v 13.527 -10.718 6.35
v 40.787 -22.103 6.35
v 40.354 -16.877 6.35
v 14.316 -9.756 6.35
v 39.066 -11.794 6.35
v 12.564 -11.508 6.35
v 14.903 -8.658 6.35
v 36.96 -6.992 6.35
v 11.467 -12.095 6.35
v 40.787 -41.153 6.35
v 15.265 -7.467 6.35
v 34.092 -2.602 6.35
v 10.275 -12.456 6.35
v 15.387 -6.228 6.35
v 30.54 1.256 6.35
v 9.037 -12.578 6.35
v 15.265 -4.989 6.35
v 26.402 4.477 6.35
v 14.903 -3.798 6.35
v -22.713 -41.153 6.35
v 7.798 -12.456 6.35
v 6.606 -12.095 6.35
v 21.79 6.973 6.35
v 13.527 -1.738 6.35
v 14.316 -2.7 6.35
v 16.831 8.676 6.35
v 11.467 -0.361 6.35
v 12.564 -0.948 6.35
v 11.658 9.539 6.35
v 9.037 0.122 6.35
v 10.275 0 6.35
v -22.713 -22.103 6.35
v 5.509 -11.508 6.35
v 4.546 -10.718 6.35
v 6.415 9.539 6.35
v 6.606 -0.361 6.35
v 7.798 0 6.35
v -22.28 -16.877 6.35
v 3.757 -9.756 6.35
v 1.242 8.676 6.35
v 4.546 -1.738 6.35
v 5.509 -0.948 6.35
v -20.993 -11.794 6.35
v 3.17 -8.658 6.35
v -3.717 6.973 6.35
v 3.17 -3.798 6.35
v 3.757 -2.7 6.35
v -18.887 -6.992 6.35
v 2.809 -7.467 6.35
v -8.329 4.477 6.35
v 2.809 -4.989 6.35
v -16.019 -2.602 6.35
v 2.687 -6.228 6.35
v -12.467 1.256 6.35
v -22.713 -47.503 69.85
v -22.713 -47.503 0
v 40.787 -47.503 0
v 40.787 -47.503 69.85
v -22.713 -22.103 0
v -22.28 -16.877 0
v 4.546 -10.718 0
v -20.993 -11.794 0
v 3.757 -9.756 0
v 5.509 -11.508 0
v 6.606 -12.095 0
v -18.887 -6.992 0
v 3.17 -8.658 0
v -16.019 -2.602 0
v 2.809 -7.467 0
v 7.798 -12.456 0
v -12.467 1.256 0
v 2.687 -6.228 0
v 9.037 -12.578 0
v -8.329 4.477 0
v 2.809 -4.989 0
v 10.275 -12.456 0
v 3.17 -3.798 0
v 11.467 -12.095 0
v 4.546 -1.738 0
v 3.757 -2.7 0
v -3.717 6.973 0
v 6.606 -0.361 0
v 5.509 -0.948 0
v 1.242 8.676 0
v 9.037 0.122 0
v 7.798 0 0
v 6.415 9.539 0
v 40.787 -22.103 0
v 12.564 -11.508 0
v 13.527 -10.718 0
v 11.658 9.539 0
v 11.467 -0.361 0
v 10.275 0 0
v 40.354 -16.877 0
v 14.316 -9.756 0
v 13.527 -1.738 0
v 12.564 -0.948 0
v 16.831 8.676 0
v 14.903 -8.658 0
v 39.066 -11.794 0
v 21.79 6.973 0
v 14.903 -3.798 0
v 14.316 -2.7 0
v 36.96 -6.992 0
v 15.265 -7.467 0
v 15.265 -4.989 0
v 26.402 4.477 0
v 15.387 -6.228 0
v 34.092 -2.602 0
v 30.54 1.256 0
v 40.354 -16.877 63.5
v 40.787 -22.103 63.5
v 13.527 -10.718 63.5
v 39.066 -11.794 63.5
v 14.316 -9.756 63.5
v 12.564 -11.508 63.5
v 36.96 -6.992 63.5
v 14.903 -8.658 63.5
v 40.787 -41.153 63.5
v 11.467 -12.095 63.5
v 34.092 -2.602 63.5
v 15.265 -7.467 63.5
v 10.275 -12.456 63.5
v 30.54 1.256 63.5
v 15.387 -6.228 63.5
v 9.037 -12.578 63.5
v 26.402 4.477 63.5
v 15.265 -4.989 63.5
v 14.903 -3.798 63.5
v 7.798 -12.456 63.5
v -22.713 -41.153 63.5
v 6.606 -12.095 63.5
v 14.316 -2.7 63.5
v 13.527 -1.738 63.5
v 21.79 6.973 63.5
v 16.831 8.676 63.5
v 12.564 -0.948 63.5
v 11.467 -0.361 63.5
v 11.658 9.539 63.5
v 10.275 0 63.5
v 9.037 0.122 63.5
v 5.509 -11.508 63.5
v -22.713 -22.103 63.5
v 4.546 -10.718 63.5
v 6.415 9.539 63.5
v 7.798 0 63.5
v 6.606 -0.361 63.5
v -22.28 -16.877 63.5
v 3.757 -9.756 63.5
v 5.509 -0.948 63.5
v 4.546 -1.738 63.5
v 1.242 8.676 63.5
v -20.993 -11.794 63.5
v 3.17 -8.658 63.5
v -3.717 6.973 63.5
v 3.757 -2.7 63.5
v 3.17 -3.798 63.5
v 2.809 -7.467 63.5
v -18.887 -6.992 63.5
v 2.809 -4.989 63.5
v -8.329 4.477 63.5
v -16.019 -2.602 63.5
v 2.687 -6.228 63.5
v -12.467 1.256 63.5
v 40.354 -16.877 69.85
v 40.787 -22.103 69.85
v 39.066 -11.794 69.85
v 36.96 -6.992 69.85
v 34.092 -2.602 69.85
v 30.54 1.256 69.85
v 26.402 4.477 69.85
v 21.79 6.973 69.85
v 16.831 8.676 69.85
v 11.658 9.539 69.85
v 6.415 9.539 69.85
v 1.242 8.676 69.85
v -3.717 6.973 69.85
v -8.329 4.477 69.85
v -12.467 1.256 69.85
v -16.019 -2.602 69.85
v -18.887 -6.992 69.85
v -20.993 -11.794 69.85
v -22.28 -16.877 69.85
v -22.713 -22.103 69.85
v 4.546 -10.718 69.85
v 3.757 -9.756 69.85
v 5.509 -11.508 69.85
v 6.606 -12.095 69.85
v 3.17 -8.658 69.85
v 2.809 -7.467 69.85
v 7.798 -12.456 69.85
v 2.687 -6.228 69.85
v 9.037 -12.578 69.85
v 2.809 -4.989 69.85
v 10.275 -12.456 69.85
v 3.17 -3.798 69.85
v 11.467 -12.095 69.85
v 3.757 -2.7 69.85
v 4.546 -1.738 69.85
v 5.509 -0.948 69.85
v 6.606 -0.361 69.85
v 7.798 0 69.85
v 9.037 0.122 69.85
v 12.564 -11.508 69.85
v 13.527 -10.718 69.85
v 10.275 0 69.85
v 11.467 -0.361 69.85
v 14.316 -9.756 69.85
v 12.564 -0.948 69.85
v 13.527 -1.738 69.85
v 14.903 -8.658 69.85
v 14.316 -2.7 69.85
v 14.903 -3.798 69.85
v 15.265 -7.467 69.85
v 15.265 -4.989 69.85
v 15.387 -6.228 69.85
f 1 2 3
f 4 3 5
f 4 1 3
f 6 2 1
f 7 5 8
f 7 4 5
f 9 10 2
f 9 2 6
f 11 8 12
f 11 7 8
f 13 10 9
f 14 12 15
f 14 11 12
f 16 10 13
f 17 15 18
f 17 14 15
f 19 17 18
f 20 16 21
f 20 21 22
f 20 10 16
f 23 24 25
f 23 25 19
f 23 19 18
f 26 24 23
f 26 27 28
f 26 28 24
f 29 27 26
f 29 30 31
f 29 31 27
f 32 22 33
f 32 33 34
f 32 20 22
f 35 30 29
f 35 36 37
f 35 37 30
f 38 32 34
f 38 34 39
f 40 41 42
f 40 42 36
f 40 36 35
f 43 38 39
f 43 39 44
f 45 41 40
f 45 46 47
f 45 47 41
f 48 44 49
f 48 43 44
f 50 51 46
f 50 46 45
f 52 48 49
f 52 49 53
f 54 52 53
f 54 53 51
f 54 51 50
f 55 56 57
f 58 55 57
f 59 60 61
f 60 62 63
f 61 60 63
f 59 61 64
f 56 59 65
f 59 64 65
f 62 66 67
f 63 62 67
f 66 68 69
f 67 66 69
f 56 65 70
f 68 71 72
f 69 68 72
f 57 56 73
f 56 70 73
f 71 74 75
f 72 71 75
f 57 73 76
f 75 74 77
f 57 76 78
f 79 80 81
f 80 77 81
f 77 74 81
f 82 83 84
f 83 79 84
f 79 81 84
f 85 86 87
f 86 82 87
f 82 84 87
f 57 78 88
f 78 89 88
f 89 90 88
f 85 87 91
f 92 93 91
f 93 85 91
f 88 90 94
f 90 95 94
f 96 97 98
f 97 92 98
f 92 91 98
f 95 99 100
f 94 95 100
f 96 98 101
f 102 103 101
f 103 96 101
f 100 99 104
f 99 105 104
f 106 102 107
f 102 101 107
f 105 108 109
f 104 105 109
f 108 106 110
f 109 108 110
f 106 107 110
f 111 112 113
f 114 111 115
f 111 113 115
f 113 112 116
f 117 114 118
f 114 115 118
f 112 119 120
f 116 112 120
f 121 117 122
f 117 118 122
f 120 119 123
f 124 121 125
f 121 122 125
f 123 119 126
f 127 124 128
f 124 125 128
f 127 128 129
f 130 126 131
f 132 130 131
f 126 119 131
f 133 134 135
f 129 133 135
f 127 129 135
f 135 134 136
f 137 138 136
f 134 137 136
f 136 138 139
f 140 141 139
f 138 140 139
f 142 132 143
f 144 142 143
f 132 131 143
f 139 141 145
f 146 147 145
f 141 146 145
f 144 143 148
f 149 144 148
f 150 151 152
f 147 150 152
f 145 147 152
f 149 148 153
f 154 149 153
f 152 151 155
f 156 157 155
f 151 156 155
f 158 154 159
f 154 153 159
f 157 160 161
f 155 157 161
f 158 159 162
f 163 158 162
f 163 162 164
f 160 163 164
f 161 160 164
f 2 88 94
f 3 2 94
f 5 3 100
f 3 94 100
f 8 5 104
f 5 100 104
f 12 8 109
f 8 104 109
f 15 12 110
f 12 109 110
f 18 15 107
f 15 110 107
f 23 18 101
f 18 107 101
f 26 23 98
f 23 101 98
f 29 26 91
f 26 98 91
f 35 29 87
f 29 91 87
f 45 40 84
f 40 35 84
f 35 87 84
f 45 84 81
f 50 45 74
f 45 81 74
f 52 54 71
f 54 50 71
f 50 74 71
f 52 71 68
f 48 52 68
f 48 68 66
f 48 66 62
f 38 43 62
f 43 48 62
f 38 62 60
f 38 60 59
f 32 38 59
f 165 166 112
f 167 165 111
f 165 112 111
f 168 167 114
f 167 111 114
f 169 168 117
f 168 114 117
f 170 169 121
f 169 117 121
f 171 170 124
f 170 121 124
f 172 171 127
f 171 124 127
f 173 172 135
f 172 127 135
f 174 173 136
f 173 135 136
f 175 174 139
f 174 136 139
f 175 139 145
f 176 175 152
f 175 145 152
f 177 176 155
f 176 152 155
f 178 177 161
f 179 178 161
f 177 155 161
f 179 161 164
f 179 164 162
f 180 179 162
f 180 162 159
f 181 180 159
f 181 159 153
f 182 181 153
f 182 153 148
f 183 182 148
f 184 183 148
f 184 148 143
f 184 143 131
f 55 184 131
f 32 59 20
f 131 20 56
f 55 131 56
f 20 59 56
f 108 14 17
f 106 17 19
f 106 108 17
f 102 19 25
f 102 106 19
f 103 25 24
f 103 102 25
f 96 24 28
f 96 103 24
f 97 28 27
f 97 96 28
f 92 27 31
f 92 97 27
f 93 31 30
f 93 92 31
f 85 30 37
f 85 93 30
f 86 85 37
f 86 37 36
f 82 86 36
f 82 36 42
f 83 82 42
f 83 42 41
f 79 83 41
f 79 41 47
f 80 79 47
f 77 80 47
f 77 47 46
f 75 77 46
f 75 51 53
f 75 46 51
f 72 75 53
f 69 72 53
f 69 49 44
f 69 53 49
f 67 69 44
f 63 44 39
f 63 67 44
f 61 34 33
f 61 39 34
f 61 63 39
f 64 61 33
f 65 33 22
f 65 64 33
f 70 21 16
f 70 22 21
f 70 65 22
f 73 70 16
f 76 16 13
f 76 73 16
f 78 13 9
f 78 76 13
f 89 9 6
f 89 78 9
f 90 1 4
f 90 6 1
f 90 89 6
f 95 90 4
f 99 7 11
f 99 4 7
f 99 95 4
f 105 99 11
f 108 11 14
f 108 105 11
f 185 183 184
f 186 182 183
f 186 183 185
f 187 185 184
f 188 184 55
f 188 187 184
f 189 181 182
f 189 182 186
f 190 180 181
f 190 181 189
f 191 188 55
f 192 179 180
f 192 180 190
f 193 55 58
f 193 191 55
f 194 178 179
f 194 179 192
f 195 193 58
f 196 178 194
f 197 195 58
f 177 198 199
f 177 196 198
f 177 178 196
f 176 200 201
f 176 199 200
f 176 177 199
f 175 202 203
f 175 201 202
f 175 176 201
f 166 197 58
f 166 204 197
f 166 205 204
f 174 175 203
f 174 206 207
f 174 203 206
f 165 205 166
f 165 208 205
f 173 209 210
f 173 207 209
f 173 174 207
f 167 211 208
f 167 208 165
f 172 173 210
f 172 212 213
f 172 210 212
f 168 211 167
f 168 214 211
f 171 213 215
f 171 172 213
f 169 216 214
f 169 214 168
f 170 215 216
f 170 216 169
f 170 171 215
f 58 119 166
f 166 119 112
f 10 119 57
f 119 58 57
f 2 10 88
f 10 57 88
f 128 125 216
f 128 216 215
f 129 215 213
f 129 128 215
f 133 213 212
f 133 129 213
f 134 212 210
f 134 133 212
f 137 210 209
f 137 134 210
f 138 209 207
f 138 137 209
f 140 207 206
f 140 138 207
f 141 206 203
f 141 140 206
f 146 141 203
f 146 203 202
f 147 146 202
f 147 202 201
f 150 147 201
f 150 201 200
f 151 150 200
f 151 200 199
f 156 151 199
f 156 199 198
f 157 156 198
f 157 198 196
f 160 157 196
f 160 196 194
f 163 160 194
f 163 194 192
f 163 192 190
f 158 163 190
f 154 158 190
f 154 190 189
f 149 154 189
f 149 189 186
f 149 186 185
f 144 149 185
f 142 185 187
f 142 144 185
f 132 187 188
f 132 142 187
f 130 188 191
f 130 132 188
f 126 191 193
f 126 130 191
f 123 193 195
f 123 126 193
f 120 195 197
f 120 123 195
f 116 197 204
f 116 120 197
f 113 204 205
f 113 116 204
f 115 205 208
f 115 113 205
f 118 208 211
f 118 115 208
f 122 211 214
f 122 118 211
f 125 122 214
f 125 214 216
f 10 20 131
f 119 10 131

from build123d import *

# Parameters (mm, degrees)
SKETCH1_R               = 6.35
BOSS_EXTRUDE1_DEPTH     = 69.85
SKETCH2_W               = 57.15
SKETCH2_H               = 54.522023849
CUT_EXTRUDE1_DEPTH      = 1
CUT_EXTRUDE1_DEPTH_BACK = 64.5


with BuildPart() as part:
    # Sketch1 → Boss-Extrude1 (new body)
    with BuildSketch(Plane.XY):
        with BuildLine():
            Line((-22.713461538, -22.102884615), (-22.713461538, -47.502884615))
            Line((-22.713461538, -47.502884615), (40.786538462, -47.502884615))
            Line((40.786538462, -47.502884615), (40.786538462, -22.102884615))
            ThreePointArc((40.786538462, -22.102884615), (9.036538462, 9.647115385), (-22.713461538, -22.102884615))
        make_face()
        with Locations((9.036538462, -6.227884615)):
            Circle(SKETCH1_R, mode=Mode.SUBTRACT)
    extrude(amount=BOSS_EXTRUDE1_DEPTH)

    # Sketch2 → Cut-Extrude1 (cut, two sides)
    with BuildSketch(Plane.ZY.offset(22.713461538)) as cut_extrude1_sk:
        with Locations((34.925, -13.891872691)):
            Rectangle(SKETCH2_W, SKETCH2_H)
    extrude(amount=CUT_EXTRUDE1_DEPTH, mode=Mode.SUBTRACT)
    extrude(cut_extrude1_sk.sketch, amount=-CUT_EXTRUDE1_DEPTH_BACK, mode=Mode.SUBTRACT)


solid = part.part
